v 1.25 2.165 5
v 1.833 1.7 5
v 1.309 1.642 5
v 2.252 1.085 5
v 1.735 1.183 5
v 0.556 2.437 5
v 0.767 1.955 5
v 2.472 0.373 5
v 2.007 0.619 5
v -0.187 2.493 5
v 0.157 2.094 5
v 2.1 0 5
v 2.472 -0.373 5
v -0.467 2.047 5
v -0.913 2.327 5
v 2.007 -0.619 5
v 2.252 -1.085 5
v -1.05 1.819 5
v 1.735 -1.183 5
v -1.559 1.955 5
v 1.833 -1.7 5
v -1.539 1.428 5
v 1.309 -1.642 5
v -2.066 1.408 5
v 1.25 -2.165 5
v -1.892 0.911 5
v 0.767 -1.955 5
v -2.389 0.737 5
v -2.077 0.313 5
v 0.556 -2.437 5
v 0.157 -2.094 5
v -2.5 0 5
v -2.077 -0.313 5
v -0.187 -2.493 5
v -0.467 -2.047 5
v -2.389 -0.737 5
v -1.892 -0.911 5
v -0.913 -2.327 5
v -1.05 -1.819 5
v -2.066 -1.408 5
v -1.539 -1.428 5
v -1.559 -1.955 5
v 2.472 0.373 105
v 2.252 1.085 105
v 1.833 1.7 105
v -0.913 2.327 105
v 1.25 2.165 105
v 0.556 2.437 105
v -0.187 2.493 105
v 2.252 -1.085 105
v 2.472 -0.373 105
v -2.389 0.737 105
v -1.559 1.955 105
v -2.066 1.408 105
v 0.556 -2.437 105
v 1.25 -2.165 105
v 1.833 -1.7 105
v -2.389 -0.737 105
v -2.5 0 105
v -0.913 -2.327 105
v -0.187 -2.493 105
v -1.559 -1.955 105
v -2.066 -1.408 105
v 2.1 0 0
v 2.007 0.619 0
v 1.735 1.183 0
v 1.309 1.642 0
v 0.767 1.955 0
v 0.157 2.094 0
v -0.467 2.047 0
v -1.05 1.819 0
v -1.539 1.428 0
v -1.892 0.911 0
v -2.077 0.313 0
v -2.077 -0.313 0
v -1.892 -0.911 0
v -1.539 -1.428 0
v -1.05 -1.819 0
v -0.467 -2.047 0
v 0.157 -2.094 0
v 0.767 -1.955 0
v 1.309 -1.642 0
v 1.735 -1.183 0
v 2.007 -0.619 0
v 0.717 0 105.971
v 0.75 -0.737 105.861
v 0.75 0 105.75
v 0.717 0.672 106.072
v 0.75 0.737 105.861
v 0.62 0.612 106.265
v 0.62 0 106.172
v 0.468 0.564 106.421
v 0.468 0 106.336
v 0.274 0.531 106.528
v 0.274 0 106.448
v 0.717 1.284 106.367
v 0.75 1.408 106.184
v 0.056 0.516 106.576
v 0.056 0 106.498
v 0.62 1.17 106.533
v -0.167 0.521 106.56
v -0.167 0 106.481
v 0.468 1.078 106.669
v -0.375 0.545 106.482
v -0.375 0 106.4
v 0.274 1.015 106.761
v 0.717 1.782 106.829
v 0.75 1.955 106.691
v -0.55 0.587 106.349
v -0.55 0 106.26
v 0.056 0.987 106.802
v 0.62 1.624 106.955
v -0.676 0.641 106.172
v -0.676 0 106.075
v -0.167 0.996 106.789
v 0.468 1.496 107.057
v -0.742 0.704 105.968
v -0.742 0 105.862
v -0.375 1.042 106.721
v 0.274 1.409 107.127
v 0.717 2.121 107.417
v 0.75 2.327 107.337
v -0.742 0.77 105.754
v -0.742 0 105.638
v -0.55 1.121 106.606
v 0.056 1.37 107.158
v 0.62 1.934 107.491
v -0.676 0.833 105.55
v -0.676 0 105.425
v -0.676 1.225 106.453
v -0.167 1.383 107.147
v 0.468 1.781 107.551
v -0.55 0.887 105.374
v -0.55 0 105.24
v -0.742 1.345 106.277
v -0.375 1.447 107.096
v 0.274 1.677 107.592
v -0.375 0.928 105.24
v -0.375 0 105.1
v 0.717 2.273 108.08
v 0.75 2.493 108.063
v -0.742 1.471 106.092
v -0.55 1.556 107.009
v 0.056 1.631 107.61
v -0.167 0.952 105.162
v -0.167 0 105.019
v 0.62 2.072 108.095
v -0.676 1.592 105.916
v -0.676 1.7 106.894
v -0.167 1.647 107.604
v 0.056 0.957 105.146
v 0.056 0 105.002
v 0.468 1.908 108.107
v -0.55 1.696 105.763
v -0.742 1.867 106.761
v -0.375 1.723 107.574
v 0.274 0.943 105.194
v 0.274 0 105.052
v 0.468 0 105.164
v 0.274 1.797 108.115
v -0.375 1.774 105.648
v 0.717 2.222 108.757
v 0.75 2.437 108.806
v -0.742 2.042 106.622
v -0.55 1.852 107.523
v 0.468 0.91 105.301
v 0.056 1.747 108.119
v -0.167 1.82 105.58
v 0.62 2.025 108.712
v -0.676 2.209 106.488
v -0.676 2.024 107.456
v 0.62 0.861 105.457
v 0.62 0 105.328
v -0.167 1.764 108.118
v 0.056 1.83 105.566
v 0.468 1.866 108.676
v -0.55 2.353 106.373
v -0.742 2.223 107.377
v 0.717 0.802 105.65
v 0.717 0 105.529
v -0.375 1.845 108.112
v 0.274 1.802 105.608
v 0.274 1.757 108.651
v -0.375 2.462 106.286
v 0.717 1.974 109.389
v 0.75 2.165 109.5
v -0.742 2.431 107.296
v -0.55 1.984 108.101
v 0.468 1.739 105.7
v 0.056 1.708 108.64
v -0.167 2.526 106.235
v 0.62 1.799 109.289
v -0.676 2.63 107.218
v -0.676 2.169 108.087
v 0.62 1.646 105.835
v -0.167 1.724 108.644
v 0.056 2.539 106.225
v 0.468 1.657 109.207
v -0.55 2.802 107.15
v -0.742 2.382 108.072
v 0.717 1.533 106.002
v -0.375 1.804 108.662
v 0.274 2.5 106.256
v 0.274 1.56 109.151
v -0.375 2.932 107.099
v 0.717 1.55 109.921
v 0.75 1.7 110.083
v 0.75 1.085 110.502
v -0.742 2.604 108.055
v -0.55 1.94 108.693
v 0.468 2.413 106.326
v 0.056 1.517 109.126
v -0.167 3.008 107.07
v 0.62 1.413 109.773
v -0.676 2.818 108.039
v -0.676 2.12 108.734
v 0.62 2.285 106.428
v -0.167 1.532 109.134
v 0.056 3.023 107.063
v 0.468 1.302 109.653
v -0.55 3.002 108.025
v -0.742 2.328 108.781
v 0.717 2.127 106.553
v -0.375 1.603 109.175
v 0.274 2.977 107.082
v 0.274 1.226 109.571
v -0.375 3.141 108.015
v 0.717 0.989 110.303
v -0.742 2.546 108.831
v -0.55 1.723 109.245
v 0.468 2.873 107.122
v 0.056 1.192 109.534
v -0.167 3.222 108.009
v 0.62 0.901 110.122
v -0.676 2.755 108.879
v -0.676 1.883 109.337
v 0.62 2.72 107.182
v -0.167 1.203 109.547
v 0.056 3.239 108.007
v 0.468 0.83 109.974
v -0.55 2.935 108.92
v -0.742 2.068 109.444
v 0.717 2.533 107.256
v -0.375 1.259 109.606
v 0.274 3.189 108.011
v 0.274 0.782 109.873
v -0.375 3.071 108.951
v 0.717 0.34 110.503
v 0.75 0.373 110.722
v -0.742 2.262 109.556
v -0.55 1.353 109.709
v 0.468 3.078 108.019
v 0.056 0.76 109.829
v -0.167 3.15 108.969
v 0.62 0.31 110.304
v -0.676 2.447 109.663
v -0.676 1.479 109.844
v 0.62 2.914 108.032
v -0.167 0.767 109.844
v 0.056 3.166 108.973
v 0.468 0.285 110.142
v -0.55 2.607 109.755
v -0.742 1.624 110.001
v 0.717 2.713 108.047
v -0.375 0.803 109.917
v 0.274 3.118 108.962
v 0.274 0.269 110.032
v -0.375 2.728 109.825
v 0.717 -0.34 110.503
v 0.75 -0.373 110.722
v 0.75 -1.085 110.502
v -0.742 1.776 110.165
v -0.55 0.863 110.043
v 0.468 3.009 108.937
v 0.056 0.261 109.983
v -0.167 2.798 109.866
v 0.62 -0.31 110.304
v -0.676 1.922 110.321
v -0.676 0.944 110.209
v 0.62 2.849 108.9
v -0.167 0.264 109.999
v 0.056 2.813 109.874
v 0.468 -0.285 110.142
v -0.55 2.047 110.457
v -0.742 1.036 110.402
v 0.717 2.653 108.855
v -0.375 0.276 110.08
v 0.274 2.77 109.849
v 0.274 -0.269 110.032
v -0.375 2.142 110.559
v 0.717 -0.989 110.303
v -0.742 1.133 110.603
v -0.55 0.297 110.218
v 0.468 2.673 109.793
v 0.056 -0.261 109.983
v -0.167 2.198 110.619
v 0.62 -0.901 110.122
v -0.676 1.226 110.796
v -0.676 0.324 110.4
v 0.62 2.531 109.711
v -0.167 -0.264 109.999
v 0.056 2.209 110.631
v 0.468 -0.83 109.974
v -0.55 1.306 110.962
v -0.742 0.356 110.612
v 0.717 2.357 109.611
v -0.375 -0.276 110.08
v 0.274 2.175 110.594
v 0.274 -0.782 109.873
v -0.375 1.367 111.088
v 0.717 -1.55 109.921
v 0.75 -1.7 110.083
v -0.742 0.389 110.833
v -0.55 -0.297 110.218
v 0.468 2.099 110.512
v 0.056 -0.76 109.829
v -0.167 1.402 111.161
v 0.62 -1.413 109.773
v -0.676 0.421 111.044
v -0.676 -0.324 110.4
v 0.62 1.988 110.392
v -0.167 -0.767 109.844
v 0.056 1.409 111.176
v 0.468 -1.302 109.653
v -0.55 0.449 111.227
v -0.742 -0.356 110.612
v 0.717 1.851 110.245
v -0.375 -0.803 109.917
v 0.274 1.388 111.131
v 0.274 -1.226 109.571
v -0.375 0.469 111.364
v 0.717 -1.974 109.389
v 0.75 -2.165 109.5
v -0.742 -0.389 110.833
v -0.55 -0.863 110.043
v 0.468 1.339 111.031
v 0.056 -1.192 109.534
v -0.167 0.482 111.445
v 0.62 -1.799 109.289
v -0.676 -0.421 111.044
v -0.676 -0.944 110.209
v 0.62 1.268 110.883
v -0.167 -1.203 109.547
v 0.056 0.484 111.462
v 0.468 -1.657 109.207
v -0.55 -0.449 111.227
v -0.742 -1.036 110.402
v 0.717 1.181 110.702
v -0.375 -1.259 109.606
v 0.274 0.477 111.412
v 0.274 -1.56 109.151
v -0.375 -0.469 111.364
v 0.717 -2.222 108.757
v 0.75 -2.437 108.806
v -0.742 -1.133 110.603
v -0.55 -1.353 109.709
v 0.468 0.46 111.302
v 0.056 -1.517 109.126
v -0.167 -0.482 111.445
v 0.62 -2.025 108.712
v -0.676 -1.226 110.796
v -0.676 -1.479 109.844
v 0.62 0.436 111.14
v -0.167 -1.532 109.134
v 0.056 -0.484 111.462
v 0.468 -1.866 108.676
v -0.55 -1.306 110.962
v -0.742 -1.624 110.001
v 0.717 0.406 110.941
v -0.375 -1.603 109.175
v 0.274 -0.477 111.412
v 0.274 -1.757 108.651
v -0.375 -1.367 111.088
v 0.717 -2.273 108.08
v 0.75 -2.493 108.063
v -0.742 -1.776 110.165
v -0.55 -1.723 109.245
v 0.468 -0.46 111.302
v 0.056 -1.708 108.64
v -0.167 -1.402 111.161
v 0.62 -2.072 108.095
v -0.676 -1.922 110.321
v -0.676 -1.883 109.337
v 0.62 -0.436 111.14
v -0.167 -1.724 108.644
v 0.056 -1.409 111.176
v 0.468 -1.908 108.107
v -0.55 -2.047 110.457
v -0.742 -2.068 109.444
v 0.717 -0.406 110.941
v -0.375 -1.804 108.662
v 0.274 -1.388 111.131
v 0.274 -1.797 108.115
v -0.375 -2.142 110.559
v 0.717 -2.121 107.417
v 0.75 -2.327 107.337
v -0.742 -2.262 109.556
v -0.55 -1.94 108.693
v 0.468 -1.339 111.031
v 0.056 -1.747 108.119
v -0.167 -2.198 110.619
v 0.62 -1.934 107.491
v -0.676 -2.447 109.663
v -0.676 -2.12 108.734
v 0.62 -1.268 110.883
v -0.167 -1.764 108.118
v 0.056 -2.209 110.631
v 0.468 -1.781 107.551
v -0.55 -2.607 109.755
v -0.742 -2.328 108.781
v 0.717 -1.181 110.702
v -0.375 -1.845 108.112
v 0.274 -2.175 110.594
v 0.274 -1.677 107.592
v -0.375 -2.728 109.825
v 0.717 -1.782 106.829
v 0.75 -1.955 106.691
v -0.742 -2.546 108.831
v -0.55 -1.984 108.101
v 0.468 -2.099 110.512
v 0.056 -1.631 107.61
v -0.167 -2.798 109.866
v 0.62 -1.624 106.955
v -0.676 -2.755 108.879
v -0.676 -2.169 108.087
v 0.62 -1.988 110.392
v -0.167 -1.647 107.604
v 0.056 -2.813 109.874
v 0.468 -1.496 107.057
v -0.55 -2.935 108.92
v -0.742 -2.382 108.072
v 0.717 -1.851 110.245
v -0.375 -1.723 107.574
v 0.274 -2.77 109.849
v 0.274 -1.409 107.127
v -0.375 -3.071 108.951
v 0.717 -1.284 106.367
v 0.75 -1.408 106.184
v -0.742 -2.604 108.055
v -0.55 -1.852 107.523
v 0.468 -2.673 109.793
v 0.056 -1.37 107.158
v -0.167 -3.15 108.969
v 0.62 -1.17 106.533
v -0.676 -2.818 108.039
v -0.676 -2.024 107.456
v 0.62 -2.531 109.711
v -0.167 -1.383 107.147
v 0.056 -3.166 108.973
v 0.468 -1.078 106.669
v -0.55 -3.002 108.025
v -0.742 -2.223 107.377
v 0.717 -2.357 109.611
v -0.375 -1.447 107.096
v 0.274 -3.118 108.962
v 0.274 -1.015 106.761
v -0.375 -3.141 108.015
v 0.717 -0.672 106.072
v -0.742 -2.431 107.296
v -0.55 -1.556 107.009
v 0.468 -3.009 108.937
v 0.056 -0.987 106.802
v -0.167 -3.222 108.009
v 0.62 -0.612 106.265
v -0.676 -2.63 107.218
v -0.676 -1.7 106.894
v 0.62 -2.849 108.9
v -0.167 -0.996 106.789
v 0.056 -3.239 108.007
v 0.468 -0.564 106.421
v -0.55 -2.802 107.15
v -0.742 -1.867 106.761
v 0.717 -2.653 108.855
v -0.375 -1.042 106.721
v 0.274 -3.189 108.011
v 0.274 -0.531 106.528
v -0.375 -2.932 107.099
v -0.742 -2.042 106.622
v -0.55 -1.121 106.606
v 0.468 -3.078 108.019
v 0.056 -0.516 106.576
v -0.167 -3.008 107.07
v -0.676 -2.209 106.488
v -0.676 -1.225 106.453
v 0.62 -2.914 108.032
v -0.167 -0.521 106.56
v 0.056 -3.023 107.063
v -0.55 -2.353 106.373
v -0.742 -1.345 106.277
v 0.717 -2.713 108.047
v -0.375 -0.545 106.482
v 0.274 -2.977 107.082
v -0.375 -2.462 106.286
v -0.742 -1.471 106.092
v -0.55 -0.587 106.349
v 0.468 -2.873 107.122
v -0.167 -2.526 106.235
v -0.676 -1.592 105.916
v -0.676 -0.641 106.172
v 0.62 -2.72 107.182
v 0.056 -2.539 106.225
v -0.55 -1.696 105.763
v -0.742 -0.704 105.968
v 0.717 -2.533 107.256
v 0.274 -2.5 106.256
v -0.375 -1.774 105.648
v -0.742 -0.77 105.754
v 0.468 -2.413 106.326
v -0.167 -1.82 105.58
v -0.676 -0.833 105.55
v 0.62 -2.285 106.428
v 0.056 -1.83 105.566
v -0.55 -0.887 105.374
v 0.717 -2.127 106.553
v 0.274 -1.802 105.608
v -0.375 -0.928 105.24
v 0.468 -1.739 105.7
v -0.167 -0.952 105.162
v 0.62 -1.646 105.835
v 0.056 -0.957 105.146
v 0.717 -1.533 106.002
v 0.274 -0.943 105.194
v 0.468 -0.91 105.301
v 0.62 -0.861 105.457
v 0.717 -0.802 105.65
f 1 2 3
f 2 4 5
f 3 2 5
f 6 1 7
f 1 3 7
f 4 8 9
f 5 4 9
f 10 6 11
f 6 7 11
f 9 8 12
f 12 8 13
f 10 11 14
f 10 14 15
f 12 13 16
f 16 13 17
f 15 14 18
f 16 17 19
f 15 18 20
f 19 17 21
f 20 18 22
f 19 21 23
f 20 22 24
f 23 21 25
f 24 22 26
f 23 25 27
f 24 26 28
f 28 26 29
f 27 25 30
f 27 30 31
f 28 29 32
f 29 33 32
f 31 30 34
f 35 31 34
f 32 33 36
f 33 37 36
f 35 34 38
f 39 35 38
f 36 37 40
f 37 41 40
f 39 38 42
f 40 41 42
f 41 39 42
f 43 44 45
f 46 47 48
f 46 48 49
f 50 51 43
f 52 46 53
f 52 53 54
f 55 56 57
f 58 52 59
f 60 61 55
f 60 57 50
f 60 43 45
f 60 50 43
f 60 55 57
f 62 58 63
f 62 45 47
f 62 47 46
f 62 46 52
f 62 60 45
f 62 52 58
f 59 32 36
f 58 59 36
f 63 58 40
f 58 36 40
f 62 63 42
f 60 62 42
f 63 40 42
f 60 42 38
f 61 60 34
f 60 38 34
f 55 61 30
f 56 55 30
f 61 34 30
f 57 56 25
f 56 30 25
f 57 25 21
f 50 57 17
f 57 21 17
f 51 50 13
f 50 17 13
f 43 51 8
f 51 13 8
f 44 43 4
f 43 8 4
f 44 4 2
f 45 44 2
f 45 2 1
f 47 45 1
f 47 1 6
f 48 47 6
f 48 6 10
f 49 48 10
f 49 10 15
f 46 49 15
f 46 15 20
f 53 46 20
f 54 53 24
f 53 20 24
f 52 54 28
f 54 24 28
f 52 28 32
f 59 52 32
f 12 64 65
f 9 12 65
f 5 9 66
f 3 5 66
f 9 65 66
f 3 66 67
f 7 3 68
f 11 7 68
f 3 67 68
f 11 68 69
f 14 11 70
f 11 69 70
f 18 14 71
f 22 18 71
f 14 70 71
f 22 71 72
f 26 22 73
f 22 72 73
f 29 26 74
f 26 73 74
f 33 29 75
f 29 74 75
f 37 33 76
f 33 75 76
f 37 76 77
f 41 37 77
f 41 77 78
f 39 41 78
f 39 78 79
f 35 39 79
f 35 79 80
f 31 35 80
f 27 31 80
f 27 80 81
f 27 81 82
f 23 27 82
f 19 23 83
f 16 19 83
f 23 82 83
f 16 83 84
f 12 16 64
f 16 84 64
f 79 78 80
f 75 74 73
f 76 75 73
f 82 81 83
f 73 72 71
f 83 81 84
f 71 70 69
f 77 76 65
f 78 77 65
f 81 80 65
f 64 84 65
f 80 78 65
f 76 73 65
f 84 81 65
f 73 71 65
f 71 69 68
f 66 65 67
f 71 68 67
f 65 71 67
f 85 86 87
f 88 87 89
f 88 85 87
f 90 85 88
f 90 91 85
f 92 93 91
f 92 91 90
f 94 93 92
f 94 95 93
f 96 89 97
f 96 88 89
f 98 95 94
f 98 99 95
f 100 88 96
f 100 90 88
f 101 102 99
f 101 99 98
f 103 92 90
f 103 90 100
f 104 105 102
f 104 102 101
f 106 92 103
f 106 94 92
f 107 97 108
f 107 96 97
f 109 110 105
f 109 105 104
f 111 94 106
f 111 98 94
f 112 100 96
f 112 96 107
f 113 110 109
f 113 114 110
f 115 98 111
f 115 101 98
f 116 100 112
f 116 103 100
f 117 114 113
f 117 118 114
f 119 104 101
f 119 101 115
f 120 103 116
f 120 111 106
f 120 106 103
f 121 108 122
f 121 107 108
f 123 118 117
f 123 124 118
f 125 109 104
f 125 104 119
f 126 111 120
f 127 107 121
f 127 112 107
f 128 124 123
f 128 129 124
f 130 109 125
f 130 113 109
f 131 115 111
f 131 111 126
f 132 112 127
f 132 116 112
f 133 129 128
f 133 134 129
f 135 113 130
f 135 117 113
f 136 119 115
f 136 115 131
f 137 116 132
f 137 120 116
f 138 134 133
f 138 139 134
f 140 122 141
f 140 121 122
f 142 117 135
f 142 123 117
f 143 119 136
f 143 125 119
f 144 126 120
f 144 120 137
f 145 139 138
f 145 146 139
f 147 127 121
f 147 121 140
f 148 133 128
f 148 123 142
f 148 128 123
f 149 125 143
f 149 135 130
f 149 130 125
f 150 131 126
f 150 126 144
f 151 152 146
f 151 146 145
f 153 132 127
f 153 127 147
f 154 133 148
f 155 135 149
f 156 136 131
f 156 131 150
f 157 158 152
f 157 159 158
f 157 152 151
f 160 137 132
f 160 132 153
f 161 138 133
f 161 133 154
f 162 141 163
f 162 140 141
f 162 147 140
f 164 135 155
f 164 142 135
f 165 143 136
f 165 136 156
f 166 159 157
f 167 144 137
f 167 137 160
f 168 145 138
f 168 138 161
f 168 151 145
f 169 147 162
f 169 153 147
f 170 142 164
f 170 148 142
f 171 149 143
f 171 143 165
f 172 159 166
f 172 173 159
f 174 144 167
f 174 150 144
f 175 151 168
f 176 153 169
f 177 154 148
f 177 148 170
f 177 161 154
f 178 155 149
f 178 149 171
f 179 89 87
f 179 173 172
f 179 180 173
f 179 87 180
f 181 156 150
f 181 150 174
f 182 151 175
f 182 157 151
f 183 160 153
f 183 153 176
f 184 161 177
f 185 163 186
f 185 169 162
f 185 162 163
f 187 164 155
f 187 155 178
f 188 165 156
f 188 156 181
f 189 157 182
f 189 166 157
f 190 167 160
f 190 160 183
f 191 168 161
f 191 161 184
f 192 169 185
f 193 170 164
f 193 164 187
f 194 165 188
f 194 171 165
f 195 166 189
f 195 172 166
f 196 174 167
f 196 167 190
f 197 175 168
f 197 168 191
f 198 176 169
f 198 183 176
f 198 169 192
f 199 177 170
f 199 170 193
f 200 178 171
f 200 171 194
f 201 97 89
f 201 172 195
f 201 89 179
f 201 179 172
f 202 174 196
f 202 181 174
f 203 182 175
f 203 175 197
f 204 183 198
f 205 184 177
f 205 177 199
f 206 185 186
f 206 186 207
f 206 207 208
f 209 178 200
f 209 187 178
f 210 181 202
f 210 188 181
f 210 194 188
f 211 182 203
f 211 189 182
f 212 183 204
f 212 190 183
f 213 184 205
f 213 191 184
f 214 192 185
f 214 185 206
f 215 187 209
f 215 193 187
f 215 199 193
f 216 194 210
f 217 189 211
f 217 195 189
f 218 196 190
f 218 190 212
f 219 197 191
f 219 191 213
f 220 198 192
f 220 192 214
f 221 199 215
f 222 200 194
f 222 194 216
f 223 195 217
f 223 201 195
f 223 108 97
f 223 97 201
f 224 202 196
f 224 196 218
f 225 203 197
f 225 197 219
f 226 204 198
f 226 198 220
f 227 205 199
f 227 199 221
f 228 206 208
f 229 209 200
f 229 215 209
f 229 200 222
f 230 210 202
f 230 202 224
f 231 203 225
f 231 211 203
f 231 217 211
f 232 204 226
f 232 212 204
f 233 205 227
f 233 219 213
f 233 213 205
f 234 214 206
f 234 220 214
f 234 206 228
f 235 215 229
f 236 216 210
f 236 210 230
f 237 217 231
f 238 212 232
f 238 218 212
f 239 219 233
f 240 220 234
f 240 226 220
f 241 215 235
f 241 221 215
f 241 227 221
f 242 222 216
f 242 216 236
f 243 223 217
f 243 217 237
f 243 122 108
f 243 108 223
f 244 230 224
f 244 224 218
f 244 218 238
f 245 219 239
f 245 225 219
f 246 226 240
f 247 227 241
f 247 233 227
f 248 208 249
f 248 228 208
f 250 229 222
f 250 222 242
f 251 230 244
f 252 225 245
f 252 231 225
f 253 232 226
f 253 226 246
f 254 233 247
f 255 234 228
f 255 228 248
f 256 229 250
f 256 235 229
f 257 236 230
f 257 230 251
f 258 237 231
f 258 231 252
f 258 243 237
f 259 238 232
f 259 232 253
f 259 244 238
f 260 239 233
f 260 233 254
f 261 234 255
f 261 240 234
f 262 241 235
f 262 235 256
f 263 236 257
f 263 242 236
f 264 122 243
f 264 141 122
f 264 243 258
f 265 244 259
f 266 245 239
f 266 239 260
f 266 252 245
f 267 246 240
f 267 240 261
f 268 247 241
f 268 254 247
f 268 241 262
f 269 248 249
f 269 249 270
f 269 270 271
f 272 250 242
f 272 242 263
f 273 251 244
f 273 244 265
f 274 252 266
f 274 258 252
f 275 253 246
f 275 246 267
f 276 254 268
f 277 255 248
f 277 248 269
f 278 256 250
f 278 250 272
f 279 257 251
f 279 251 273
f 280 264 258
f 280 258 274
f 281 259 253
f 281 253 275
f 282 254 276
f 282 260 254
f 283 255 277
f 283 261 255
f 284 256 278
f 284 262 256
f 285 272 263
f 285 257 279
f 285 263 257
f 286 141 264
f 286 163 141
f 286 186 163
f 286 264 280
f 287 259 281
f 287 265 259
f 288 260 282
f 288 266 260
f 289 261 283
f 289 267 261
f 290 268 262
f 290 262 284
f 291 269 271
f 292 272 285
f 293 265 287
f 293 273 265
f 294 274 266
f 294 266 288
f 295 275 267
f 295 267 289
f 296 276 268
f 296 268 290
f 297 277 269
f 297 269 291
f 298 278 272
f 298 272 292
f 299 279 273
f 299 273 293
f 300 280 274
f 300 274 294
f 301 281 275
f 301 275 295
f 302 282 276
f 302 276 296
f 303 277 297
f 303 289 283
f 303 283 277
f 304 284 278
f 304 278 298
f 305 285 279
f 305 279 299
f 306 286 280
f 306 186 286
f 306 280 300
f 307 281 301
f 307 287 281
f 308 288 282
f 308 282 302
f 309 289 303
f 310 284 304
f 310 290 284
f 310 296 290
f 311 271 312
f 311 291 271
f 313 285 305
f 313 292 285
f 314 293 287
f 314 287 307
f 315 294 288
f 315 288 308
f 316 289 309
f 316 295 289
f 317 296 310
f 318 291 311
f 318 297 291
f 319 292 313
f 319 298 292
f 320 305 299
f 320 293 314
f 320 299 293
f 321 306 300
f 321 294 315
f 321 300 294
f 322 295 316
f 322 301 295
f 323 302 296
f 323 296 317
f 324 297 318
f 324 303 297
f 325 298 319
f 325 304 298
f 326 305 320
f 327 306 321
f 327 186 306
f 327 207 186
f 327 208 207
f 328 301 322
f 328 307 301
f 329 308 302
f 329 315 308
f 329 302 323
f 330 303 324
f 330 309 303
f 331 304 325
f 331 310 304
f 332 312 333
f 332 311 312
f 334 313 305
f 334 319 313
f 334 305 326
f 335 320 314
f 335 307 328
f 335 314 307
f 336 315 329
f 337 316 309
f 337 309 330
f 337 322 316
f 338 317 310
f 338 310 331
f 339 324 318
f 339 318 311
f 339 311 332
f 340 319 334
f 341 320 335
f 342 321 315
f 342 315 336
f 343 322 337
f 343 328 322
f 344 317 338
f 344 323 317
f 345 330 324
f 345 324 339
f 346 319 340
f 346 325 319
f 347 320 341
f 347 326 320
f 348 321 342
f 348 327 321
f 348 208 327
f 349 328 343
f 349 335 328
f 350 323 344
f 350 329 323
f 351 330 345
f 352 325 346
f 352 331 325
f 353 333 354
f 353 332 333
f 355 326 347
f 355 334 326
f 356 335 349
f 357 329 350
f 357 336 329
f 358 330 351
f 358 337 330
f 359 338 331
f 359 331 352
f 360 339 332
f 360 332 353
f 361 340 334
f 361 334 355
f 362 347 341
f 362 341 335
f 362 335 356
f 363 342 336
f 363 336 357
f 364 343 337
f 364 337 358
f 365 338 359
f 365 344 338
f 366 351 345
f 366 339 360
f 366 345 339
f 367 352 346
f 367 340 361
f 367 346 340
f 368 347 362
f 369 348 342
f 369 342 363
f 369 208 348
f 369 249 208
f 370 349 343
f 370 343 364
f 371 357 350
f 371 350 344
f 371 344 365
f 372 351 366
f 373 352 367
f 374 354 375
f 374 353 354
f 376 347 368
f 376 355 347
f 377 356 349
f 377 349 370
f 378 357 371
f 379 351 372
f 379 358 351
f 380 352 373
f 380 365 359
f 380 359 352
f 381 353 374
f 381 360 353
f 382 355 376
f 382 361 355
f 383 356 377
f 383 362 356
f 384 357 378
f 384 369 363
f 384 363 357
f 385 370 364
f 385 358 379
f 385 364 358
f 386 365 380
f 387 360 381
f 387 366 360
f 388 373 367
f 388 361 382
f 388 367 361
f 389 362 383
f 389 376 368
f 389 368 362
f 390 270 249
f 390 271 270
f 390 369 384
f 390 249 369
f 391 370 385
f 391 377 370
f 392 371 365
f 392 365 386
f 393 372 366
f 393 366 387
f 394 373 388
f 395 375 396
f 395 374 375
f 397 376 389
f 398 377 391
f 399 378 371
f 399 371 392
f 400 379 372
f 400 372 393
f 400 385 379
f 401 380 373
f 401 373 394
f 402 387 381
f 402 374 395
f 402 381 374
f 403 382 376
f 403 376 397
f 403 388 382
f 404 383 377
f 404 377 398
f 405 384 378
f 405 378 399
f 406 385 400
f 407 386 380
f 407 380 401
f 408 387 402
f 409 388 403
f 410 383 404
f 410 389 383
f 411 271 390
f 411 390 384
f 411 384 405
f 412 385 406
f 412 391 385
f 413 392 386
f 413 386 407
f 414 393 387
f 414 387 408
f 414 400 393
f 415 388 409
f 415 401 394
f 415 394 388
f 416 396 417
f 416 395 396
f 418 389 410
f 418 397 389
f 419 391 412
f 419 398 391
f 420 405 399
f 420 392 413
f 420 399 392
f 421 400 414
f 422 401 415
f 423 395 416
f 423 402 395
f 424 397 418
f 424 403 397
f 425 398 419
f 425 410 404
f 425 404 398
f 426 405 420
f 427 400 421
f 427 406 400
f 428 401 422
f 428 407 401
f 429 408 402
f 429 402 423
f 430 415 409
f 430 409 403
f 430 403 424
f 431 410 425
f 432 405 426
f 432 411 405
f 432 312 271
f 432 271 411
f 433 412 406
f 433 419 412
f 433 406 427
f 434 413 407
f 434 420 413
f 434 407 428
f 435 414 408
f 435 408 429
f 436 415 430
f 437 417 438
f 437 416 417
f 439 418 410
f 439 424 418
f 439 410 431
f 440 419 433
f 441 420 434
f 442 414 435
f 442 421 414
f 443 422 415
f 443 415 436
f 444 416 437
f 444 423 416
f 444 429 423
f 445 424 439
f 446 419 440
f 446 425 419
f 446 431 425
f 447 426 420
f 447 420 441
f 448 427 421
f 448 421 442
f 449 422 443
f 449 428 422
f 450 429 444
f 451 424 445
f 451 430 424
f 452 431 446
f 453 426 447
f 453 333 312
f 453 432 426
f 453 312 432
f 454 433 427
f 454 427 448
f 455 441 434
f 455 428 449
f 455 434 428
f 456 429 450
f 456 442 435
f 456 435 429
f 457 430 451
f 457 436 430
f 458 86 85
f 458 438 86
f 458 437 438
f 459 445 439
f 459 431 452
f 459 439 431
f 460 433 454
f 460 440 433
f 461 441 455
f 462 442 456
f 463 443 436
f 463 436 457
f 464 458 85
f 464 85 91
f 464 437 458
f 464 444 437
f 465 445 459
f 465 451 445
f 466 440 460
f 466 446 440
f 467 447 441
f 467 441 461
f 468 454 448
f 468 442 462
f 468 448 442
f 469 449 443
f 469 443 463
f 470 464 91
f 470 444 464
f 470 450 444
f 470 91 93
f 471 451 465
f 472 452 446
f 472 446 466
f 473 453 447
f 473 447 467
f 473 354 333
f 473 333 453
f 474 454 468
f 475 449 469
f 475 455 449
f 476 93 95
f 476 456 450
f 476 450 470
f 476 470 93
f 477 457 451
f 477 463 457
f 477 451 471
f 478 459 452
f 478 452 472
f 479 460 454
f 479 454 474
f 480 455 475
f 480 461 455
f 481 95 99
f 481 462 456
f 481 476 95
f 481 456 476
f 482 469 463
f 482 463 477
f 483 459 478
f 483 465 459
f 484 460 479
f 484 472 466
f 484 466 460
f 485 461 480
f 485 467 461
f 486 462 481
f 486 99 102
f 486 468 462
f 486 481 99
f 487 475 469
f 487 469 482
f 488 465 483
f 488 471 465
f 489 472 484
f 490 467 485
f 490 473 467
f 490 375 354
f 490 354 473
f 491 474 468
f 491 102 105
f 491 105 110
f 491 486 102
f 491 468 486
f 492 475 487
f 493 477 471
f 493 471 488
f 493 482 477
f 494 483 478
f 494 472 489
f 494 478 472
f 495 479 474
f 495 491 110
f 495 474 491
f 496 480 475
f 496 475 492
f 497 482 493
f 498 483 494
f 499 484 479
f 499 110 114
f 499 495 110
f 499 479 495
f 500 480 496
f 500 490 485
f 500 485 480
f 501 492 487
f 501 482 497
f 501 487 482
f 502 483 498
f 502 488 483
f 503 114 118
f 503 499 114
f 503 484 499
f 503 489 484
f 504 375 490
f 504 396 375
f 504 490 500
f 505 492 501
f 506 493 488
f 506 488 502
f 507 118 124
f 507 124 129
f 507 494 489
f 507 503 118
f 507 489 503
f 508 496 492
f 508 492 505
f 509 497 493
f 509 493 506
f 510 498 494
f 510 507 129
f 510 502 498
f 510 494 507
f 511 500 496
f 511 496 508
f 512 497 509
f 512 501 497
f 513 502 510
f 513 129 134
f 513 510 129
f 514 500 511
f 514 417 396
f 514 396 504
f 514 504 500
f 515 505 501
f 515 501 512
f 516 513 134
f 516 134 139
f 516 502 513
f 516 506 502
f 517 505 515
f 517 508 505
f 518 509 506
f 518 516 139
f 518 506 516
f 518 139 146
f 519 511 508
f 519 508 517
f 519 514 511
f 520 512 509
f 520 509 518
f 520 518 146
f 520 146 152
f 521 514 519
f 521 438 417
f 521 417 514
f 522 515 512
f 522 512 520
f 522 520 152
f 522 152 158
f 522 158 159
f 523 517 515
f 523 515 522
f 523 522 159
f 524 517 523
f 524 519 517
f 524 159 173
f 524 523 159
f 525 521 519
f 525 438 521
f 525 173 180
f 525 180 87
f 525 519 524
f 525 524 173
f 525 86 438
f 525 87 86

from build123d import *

# Parameters (mm, degrees)
SKETCH1_R           = 2.1
BOSS_EXTRUDE1_DEPTH = 5
SKETCH2_R           = 2.5
BOSS_EXTRUDE2_DEPTH = 100
SKETCH6_R           = 0.75


with BuildPart() as part:
    # Sketch1 → Boss-Extrude1 (new body)
    with BuildSketch(Plane.XY):
        Circle(SKETCH1_R)
    extrude(amount=BOSS_EXTRUDE1_DEPTH)

    # Sketch2 → Boss-Extrude2 (add)
    with BuildSketch(Plane.XY.offset(5)):
        with Locations(Location((0, 0, 0), (0, 0, 180))):
            Circle(SKETCH2_R)
    extrude(amount=BOSS_EXTRUDE2_DEPTH)


with BuildPart() as body_2:
    # Sweep1: sweep along a path in Sketch3
    with BuildLine(Plane(origin=(0, 0, 0), x_dir=(0, 0, -1), z_dir=(1, 0, 0))) as sweep1_path:
        CenterArc((-108.25, 0), 2.5, 0, 360)
    # Sketch6 → Sweep1 (sweep)
    with BuildSketch(Plane(origin=(0, 0, 0), x_dir=(1, 0, 0), z_dir=(0, 1, 0))):
        with Locations((0, -105.75)):
            Circle(SKETCH6_R)
    sweep(path=sweep1_path.line)


solid = Compound([part.part, body_2.part])
